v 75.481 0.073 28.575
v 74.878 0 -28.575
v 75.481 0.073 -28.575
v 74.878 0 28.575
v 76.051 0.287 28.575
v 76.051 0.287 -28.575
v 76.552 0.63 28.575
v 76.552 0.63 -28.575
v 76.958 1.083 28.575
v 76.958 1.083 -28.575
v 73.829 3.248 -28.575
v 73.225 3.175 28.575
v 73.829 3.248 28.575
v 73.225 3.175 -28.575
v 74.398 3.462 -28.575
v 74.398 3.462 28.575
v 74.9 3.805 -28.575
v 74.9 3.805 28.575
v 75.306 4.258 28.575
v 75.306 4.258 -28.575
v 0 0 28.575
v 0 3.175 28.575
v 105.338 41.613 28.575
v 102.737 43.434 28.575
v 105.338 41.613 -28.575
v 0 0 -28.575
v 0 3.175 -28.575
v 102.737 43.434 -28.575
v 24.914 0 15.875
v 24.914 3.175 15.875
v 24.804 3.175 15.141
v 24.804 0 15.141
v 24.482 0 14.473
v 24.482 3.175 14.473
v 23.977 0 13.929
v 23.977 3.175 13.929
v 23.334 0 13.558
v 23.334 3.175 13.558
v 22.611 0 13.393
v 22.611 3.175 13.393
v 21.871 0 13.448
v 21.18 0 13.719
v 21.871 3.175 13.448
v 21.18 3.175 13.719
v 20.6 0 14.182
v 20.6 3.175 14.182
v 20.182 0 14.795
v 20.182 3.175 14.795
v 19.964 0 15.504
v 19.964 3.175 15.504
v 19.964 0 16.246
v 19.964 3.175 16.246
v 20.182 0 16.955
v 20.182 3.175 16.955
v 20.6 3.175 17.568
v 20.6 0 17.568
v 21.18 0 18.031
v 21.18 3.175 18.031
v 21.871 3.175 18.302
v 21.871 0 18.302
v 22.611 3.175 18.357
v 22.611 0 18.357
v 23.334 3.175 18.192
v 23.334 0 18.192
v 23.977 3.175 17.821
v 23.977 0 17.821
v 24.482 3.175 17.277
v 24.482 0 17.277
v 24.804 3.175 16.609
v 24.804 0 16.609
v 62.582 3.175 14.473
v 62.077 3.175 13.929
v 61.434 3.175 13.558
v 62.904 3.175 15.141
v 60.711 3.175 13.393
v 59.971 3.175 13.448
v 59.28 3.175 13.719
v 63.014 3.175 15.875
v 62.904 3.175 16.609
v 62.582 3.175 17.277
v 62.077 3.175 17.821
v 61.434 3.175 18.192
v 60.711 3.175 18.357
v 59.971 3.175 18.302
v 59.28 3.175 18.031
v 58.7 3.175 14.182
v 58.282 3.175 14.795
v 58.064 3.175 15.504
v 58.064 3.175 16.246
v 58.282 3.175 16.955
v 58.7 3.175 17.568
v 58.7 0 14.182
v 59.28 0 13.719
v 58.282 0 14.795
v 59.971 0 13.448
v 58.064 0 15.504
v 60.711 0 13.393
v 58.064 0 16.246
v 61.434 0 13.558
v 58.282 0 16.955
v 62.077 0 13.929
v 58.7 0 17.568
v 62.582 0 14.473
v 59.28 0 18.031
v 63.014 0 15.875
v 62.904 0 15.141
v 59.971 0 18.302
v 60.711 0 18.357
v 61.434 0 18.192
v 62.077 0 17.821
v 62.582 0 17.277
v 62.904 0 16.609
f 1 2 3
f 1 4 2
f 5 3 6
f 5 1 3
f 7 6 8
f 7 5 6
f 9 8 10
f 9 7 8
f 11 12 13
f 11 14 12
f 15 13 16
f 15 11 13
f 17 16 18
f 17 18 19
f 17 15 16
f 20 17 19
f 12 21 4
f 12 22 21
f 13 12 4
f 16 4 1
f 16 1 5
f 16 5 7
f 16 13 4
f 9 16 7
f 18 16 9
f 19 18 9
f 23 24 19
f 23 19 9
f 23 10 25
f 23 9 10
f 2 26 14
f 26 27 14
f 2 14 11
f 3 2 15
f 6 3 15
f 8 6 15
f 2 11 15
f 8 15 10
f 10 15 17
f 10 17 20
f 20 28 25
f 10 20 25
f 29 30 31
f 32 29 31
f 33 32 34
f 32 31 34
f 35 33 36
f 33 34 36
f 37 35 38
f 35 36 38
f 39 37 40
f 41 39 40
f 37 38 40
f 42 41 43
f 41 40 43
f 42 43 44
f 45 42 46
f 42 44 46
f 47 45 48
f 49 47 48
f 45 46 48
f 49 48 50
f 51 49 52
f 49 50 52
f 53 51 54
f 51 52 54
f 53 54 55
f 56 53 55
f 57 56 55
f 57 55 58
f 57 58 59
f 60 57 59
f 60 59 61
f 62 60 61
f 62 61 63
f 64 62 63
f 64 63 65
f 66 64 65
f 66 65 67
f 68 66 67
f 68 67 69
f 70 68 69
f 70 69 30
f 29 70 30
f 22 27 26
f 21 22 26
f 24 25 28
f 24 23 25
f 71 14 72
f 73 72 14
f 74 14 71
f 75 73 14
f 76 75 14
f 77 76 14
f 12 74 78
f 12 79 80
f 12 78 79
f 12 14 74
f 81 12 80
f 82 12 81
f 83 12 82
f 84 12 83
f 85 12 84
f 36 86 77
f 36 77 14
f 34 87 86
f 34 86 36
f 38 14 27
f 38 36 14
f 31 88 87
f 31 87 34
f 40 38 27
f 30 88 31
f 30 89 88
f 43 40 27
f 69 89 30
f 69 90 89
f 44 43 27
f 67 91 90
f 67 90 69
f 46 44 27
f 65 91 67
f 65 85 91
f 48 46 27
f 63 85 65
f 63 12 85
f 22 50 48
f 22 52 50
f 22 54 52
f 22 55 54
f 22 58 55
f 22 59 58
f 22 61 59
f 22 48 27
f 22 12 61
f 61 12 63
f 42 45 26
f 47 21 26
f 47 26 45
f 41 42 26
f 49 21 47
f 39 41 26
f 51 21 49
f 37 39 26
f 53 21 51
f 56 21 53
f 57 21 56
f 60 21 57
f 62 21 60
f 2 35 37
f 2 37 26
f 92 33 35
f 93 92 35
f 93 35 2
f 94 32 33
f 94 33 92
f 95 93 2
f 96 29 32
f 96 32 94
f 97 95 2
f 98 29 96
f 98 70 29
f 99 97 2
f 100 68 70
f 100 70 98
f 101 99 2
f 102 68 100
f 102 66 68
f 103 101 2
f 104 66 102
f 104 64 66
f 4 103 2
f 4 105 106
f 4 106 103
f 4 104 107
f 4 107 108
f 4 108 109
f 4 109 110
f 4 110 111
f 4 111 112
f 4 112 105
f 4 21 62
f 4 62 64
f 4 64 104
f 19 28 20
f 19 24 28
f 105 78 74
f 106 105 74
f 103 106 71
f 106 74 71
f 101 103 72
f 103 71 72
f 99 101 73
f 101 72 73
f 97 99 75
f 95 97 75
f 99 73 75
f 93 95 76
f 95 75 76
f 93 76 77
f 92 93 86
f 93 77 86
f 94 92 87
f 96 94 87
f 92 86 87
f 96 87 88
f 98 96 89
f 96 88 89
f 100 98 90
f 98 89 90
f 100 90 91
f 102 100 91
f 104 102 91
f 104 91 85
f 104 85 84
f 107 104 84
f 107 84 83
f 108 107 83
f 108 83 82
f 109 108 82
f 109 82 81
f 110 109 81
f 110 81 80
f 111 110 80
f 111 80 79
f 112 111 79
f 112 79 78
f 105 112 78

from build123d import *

# Parameters (mm, degrees)
BOSS_EXTRUDE1_DEPTH = 28.575
FILLET1_R           = 2.54
FILLET2_R           = 2.54
SKETCH2_R           = 2.4892
CUT_EXTRUDE1_DEPTH  = 4.175


with BuildPart() as part:
    # Sketch1 → Boss-Extrude1 (new body, symmetric)
    with BuildSketch(Plane.XY):
        Polygon((76.2, 0), (73.599192259, 1.821105185), (74.547199614, 3.175), (0, 3.175), (0, 0), align=None)
        Polygon((76.2, 3.175), (76.2, 0), (105.337682967, 41.61292385), (102.736875226, 43.434029035), (74.547199614, 3.175), align=None)
        Polygon((74.547199614, 3.175), (73.599192259, 1.821105185), (76.2, 0), (76.2, 3.175), align=None)
    extrude(amount=BOSS_EXTRUDE1_DEPTH, both=True)

    # Fillet1
    fillet1_edges = [part.edges().sort_by_distance(p)[0] for p in [
        (74.547199614, 3.175, 0),
    ]]
    fillet(fillet1_edges, radius=FILLET1_R)

    # Fillet2
    fillet2_edges = [part.edges().sort_by_distance(p)[0] for p in [
        (76.2, 0, 0),
    ]]
    fillet(fillet2_edges, radius=FILLET2_R)

    # Sketch2 → Cut-Extrude1 (cut, through all)
    with BuildSketch(Plane(origin=(0, 3.175, 0), x_dir=(1, 0, 0), z_dir=(0, 1, 0))):
        with Locations((60.524959306, -15.875)):
            Circle(SKETCH2_R)
        with Locations((22.424959306, -15.875)):
            Circle(SKETCH2_R)
    extrude(amount=-CUT_EXTRUDE1_DEPTH, mode=Mode.SUBTRACT)


solid = part.part
